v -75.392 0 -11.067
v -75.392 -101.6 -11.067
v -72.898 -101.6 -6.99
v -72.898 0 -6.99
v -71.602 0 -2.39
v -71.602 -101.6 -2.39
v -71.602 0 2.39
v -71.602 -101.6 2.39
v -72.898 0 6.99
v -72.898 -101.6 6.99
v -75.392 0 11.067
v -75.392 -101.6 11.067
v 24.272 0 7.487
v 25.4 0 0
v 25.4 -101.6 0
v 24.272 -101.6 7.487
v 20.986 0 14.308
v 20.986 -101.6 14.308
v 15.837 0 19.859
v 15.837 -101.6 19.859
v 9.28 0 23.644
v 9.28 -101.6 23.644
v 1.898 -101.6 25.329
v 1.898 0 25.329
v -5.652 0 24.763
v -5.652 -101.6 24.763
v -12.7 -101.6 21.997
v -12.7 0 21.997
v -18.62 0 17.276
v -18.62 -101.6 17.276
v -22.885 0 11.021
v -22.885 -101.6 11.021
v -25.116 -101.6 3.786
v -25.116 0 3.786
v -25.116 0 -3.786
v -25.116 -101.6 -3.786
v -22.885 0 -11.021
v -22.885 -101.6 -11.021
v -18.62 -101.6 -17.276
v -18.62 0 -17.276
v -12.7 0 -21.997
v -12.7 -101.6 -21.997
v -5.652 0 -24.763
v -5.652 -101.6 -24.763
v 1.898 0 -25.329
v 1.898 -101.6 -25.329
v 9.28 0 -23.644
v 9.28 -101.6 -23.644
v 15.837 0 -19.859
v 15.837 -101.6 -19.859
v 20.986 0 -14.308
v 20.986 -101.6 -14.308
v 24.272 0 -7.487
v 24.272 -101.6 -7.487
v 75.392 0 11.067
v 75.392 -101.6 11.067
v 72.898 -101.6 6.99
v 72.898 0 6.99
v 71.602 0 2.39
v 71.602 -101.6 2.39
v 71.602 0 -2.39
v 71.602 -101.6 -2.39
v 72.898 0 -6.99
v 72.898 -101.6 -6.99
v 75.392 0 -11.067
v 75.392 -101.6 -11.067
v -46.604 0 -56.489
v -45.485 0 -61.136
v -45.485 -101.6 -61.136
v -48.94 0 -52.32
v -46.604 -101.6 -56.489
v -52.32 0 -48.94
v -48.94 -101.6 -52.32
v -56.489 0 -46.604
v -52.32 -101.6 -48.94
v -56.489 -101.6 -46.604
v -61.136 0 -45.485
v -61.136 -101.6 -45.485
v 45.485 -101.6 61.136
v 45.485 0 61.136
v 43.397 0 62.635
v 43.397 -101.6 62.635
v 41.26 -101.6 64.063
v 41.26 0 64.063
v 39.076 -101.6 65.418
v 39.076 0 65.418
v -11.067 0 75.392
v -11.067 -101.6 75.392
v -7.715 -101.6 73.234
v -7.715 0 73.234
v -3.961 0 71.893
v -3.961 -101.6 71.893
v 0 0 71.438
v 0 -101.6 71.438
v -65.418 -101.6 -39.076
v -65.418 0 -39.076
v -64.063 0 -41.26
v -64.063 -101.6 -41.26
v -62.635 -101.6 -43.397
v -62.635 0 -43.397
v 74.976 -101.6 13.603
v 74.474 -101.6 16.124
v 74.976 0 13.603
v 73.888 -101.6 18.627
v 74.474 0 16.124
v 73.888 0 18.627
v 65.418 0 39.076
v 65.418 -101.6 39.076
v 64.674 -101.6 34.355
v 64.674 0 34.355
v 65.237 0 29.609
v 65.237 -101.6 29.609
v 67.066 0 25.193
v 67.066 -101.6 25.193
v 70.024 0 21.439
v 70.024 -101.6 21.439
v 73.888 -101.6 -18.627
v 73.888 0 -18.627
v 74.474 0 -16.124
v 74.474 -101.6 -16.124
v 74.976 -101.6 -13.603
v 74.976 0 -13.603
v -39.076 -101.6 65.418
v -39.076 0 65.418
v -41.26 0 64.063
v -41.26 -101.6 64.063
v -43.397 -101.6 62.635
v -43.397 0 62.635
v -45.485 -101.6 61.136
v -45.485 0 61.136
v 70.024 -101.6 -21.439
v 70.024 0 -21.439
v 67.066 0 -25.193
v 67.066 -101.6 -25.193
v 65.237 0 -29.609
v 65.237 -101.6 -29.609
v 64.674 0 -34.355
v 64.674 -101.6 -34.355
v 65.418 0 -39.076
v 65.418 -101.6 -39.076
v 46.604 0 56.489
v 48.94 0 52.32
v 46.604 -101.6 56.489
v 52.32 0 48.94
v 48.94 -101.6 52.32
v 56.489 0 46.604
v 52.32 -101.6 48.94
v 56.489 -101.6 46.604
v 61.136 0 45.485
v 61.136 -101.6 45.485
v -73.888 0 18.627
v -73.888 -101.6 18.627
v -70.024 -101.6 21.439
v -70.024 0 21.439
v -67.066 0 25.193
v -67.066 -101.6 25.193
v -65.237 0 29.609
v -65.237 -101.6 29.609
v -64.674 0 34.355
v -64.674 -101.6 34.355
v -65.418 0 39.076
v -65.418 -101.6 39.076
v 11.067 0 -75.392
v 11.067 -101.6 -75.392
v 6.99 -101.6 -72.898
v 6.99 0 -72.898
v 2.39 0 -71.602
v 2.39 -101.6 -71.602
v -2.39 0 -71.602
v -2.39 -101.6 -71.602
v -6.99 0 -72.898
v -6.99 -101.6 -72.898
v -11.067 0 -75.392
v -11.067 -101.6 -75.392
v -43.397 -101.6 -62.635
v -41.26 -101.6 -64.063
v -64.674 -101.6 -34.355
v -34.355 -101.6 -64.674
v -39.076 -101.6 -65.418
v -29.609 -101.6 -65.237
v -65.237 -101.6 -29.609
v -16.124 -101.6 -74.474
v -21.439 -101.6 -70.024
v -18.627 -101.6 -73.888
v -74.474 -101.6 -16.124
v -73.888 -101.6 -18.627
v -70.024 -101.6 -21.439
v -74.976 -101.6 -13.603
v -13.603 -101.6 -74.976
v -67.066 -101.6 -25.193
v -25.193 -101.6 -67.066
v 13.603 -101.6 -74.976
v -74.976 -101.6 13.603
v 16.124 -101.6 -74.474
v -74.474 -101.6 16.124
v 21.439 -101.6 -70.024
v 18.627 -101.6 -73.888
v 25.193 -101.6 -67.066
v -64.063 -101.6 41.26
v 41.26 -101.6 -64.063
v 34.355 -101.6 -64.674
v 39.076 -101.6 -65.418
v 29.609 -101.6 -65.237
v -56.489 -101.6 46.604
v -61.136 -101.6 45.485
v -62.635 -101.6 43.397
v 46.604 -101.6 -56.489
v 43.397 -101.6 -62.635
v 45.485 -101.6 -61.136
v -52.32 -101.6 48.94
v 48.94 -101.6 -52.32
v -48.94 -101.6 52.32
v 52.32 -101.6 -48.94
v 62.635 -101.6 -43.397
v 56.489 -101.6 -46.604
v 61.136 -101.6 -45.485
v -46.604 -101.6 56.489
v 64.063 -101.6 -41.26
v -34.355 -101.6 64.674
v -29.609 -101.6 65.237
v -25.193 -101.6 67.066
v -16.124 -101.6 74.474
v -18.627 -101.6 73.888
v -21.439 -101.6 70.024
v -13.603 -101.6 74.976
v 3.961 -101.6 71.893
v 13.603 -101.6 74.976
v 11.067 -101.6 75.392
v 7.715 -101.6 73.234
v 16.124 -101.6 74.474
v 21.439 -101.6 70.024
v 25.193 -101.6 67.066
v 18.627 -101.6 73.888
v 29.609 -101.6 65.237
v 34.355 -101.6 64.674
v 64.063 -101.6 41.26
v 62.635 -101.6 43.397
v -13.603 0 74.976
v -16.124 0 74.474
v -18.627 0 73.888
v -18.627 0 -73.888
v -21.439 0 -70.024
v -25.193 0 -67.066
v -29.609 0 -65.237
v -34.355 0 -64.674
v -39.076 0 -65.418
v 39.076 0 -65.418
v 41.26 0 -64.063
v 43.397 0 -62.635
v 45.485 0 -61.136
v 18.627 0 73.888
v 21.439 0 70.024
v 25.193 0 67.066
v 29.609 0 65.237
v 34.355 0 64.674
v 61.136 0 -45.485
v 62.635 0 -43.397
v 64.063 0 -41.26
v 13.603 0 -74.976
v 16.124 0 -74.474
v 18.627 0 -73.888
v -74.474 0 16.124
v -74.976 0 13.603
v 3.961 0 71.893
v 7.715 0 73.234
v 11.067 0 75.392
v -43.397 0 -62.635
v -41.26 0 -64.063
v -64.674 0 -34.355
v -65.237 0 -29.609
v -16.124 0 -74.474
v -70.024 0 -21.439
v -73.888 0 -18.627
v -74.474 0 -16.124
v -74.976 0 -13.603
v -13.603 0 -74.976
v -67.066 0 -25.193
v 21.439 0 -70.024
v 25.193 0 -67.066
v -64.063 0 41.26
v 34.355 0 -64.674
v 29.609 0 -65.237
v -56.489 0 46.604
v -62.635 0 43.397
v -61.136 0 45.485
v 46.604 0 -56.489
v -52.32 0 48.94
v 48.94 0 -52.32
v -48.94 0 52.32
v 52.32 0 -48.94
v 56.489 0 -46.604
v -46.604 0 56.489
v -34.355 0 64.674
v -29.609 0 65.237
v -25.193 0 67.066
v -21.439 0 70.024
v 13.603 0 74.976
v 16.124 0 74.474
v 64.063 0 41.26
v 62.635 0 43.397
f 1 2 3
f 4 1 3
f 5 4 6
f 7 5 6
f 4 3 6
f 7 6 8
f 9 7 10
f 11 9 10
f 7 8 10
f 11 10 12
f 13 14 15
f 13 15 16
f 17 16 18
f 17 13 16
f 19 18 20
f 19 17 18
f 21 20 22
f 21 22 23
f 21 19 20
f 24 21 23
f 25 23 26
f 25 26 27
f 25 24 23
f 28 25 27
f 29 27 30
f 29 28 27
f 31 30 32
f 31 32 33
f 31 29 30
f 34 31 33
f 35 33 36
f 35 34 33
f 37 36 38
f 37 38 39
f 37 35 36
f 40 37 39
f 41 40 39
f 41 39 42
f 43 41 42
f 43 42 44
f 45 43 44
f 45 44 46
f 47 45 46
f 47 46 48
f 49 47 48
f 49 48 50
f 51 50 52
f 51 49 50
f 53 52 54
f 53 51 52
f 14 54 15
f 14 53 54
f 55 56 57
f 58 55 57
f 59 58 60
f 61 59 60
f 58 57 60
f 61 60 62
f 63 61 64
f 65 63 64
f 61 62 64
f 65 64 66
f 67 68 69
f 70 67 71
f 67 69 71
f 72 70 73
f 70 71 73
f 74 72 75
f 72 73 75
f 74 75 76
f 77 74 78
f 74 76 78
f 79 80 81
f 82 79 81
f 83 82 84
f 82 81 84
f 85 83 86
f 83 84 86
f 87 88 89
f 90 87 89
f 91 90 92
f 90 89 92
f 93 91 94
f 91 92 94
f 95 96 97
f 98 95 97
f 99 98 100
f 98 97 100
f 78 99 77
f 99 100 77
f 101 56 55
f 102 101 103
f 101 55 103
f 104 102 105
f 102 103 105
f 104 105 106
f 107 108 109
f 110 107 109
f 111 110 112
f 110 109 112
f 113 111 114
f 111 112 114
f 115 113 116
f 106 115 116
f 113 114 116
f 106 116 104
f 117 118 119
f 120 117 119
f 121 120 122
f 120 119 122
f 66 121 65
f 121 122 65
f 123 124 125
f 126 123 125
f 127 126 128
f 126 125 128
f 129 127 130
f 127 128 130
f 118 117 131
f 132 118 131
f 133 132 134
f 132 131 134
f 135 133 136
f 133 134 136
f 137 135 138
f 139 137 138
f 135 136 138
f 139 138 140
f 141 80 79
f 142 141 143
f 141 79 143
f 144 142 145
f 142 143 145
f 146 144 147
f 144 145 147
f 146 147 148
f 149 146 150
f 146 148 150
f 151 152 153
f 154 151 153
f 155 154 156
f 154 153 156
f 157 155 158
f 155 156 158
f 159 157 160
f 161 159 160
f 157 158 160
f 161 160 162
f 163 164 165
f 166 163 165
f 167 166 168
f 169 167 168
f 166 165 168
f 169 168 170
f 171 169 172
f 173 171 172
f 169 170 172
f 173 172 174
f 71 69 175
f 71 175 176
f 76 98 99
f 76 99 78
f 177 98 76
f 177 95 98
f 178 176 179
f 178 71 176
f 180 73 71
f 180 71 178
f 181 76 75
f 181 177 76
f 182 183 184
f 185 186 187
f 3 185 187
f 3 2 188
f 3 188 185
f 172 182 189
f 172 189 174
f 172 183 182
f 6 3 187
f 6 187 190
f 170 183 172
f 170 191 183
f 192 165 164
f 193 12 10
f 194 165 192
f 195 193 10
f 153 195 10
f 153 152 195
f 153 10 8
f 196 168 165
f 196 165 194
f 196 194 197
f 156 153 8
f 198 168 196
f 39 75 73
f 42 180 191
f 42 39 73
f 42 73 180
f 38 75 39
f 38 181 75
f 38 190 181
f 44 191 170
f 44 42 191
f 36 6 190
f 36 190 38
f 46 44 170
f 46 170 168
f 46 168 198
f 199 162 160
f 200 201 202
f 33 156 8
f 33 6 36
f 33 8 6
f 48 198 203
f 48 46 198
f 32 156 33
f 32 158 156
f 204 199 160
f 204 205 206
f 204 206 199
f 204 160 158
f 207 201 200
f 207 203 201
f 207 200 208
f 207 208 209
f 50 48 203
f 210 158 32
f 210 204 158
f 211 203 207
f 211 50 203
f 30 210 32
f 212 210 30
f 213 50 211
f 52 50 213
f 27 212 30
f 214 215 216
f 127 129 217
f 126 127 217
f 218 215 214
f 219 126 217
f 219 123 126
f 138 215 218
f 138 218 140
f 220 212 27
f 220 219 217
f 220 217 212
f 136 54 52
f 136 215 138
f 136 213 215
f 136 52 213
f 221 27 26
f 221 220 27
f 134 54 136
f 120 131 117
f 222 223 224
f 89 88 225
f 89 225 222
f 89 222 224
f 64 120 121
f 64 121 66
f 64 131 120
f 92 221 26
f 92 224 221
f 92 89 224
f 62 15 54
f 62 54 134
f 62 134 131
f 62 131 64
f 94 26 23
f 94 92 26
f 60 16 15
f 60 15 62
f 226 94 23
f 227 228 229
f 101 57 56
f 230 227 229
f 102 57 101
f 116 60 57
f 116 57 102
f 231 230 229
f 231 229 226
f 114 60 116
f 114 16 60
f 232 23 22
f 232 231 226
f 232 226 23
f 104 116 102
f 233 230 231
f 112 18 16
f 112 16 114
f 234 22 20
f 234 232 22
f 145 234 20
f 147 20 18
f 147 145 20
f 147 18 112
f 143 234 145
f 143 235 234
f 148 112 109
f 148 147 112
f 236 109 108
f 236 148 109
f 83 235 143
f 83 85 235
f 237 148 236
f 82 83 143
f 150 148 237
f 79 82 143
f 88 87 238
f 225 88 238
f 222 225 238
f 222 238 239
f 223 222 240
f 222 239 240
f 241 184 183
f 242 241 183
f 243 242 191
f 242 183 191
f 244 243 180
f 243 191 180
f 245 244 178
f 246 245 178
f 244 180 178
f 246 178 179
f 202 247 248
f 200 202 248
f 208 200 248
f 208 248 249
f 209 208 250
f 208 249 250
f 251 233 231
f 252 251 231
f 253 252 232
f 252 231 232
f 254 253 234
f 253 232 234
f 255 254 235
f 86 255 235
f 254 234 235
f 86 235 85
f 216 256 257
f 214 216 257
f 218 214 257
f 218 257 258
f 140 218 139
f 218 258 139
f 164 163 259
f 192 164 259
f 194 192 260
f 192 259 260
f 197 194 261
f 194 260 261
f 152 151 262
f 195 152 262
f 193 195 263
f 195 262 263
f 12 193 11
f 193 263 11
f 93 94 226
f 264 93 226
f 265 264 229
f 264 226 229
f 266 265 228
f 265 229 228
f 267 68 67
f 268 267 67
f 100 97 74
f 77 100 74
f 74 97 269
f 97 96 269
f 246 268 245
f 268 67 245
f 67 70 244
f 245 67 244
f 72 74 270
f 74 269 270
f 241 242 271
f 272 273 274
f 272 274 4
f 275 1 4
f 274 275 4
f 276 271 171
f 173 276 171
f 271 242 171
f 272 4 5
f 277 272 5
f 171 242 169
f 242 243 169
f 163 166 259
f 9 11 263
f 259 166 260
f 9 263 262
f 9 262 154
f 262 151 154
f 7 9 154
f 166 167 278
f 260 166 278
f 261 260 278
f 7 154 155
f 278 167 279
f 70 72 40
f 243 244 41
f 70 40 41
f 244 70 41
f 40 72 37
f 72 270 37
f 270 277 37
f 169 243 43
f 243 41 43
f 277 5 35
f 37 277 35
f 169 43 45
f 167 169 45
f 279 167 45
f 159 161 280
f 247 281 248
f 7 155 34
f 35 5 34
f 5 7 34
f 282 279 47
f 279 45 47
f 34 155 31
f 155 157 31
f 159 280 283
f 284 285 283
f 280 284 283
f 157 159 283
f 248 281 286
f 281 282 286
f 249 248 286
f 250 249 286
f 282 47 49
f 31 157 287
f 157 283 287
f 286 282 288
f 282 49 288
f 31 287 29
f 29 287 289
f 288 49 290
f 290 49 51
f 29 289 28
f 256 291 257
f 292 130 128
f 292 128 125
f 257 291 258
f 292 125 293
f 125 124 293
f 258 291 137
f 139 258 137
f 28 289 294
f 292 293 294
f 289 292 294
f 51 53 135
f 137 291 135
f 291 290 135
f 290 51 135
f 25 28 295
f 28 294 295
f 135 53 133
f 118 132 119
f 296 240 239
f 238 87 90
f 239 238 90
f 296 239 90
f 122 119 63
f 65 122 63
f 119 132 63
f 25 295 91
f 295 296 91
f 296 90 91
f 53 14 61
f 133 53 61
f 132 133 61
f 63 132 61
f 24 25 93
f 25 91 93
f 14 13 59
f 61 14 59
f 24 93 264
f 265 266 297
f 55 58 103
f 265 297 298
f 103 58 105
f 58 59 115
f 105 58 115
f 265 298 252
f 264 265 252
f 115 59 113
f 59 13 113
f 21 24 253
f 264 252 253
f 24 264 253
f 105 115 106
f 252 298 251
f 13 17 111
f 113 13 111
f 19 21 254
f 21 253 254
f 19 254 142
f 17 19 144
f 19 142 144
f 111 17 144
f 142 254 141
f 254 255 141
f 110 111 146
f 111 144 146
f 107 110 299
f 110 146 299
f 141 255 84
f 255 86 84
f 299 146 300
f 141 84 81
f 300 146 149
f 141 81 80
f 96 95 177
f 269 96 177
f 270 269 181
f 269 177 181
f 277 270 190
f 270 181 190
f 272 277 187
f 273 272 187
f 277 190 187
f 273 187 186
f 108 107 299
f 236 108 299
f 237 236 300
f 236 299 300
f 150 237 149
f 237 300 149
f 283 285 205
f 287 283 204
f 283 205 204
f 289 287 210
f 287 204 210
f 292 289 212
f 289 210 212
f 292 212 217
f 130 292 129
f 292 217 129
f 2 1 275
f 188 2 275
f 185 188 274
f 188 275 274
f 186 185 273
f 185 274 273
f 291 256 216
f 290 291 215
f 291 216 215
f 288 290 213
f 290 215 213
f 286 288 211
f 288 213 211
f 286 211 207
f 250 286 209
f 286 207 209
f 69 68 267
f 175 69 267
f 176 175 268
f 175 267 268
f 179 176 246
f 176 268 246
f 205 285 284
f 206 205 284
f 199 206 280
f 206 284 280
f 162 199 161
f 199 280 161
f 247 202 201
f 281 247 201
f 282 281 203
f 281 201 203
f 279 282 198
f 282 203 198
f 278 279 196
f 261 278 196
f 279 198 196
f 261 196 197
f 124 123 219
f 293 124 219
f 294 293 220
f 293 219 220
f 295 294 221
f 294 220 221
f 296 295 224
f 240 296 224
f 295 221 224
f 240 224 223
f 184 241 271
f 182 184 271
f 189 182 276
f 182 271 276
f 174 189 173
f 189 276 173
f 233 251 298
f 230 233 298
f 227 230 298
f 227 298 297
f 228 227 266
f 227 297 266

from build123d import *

# Parameters (mm, degrees)
F0_R     = 76.2
F0_R_2   = 25.4
F1_DEPTH = 101.6
F3_DEPTH = 101.6


with BuildPart() as f1:
    # F0 (on Front) → F1 (new body)
    with BuildSketch(Plane.XZ):
        Circle(F0_R)
        Circle(F0_R_2, mode=Mode.SUBTRACT)
    extrude(amount=F1_DEPTH)

    # F2 (on face) → F3 (cut)
    with BuildSketch(Plane.XZ.offset(101.6)):
        with BuildLine():
            ThreePointArc((39.0757230448, 65.4181004656), (29.1604775462, 70.3996203774), (18.6268737068, 73.8882911963))
            ThreePointArc((18.6268737068, 73.8882911963), (27.3379476996, 65.9996441038), (39.0757230448, 65.4181004656))
        make_face()
        with BuildLine():
            ThreePointArc((61.1356839641, 45.484812259), (53.8815367264, 53.8815367264), (45.484812259, 61.1356839641))
            ThreePointArc((45.484812259, 61.1356839641), (50.513940681, 50.513940681), (61.1356839641, 45.484812259))
        make_face()
        with BuildLine():
            ThreePointArc((73.8882911963, 18.6268737068), (70.3996203774, 29.1604775462), (65.4181004656, 39.0757230448))
            ThreePointArc((65.4181004656, 39.0757230448), (65.9996441038, 27.3379476996), (73.8882911963, 18.6268737068))
        make_face()
        with BuildLine():
            ThreePointArc((76.2, 0), (75.9977505688, 5.5481445982), (75.3920758929, 11.0668375142))
            ThreePointArc((75.3920758929, 11.0668375142), (71.4375, 0), (75.3920758929, -11.0668375142))
            ThreePointArc((75.3920758929, -11.0668375142), (75.9977505688, -5.5481445982), (76.2, 0))
        make_face()
        with BuildLine():
            ThreePointArc((65.4181004656, -39.0757230448), (70.3996203774, -29.1604775462), (73.8882911963, -18.6268737068))
            ThreePointArc((73.8882911963, -18.6268737068), (65.9996441038, -27.3379476996), (65.4181004656, -39.0757230448))
        make_face()
        with BuildLine():
            ThreePointArc((45.484812259, -61.1356839641), (53.8815367264, -53.8815367264), (61.1356839641, -45.484812259))
            ThreePointArc((61.1356839641, -45.484812259), (50.513940681, -50.513940681), (45.484812259, -61.1356839641))
        make_face()
        with BuildLine():
            ThreePointArc((18.6268737068, -73.8882911963), (29.1604775462, -70.3996203774), (39.0757230448, -65.4181004656))
            ThreePointArc((39.0757230448, -65.4181004656), (27.3379476996, -65.9996441038), (18.6268737068, -73.8882911963))
        make_face()
        with BuildLine():
            ThreePointArc((11.0668375142, -75.3920758929), (0, -71.4375), (-11.0668375142, -75.3920758929))
            ThreePointArc((-11.0668375142, -75.3920758929), (0, -76.2), (11.0668375142, -75.3920758929))
        make_face()
        with BuildLine():
            ThreePointArc((-18.6268737068, -73.8882911963), (-27.3379476996, -65.9996441038), (-39.0757230448, -65.4181004656))
            ThreePointArc((-39.0757230448, -65.4181004656), (-29.1604775462, -70.3996203774), (-18.6268737068, -73.8882911963))
        make_face()
        with BuildLine():
            ThreePointArc((-45.484812259, -61.1356839641), (-50.513940681, -50.513940681), (-61.1356839641, -45.484812259))
            ThreePointArc((-61.1356839641, -45.484812259), (-53.8815367264, -53.8815367264), (-45.484812259, -61.1356839641))
        make_face()
        with BuildLine():
            ThreePointArc((-65.4181004656, -39.0757230448), (-65.9996441038, -27.3379476996), (-73.8882911963, -18.6268737068))
            ThreePointArc((-73.8882911963, -18.6268737068), (-70.3996203774, -29.1604775462), (-65.4181004656, -39.0757230448))
        make_face()
        with BuildLine():
            ThreePointArc((-75.3920758929, -11.0668375142), (-71.4375, 0), (-75.3920758929, 11.0668375142))
            ThreePointArc((-75.3920758929, 11.0668375142), (-76.2, 0), (-75.3920758929, -11.0668375142))
        make_face()
        with BuildLine():
            ThreePointArc((-73.8882911963, 18.6268737068), (-65.9996441038, 27.3379476996), (-65.4181004656, 39.0757230448))
            ThreePointArc((-65.4181004656, 39.0757230448), (-70.3996203774, 29.1604775462), (-73.8882911963, 18.6268737068))
        make_face()
        with BuildLine():
            ThreePointArc((-61.1356839641, 45.484812259), (-50.513940681, 50.513940681), (-45.484812259, 61.1356839641))
            ThreePointArc((-45.484812259, 61.1356839641), (-53.8815367264, 53.8815367264), (-61.1356839641, 45.484812259))
        make_face()
        with BuildLine():
            ThreePointArc((-39.0757230448, 65.4181004656), (-27.3379476996, 65.9996441038), (-18.6268737068, 73.8882911963))
            ThreePointArc((-18.6268737068, 73.8882911963), (-29.1604775462, 70.3996203774), (-39.0757230448, 65.4181004656))
        make_face()
        with BuildLine():
            Line((0, 76.2), (0, 71.4375))
            ThreePointArc((0, 71.4375), (5.8760863476, 72.455836431), (11.0668375142, 75.3920758929))
            ThreePointArc((11.0668375142, 75.3920758929), (5.5481445982, 75.9977505688), (0, 76.2))
        make_face()
        with BuildLine():
            ThreePointArc((-11.0668375142, 75.3920758929), (-5.8760863476, 72.455836431), (0, 71.4375))
            Line((0, 71.4375), (0, 76.2))
            ThreePointArc((0, 76.2), (-5.5481445982, 75.9977505688), (-11.0668375142, 75.3920758929))
        make_face()
    extrude(amount=-F3_DEPTH, mode=Mode.SUBTRACT)


solid = f1.part
